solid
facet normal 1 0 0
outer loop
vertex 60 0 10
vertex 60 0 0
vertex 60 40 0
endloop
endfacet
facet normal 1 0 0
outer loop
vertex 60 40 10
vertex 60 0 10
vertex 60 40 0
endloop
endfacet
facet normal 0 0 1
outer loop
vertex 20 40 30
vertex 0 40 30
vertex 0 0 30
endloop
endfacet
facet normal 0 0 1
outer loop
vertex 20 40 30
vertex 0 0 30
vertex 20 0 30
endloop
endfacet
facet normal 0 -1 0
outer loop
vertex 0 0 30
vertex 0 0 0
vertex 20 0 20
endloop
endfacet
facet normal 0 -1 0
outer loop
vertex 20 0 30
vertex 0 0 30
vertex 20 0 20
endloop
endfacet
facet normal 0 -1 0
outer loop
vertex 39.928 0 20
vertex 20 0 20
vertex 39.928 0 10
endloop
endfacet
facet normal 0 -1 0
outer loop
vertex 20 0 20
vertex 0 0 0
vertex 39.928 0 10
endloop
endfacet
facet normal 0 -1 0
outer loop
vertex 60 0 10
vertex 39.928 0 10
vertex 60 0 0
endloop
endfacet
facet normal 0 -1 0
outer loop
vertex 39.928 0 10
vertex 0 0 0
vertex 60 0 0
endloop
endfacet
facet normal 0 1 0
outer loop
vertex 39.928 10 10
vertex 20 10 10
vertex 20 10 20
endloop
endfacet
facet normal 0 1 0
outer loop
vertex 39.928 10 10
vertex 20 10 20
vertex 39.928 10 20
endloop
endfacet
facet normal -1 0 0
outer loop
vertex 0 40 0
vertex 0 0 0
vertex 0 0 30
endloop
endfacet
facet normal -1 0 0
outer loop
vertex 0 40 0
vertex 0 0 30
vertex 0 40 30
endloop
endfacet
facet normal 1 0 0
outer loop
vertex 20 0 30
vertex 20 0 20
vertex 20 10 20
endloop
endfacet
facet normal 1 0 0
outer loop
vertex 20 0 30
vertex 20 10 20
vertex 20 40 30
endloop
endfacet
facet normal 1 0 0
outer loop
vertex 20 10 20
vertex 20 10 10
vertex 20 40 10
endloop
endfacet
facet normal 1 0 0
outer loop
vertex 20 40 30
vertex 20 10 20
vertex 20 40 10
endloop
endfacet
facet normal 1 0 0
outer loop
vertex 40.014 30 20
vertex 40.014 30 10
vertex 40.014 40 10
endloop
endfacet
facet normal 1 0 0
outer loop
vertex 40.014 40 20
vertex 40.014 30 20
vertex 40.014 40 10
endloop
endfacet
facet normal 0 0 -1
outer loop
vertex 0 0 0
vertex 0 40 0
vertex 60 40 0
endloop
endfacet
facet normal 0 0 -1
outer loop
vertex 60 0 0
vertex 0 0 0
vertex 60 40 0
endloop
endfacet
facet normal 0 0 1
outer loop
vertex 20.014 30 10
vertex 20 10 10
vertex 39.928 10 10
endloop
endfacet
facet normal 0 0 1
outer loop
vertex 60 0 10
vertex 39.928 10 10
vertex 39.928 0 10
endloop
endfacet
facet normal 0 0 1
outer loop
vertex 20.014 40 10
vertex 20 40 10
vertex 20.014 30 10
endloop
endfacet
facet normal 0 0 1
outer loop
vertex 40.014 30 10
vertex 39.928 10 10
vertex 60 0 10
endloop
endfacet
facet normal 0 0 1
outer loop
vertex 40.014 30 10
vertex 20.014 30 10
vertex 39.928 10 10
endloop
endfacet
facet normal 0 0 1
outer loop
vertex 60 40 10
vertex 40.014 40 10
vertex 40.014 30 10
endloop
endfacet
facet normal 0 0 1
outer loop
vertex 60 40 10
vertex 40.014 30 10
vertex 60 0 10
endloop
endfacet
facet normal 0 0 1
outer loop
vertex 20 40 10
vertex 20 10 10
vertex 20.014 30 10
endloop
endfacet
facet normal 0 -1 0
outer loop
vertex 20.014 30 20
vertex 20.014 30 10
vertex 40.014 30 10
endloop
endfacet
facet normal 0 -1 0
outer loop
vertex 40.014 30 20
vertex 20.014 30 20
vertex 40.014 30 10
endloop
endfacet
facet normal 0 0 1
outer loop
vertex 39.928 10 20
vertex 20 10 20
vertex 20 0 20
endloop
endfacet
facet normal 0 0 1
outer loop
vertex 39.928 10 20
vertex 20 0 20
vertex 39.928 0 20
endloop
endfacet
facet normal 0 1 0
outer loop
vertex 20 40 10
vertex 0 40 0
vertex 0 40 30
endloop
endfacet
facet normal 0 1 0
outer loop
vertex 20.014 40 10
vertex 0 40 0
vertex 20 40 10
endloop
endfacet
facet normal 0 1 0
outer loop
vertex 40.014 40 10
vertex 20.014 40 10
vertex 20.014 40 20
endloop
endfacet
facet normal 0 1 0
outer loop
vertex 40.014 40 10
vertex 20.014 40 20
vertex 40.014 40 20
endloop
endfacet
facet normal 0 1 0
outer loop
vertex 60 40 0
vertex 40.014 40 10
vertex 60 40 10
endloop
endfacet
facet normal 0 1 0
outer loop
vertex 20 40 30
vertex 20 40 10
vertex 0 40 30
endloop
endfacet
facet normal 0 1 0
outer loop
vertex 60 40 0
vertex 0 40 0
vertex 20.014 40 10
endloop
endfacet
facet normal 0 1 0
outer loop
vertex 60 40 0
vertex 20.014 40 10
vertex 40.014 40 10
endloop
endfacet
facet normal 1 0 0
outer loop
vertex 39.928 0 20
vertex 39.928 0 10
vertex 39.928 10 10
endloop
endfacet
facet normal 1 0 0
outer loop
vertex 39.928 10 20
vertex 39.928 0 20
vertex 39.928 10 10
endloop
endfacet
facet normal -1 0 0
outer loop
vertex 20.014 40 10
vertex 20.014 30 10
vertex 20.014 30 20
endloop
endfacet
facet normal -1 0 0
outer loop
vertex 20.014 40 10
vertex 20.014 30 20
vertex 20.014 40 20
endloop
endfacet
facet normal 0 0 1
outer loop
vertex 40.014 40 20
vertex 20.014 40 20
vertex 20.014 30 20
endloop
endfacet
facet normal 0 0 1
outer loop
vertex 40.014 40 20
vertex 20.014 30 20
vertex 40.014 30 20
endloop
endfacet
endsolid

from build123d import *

# Parameters (mm, degrees)
F0_W     = 60
F0_H     = 40
F3_DEPTH = 10
F1_W     = 20
F1_H     = 40
F4_DEPTH = 30
F2_W     = 20
F2_H     = 10
F5_DEPTH = 20


with BuildPart() as f3:
    # F0 (on Top) → F3 (new body)
    with BuildSketch(Plane.XY):
        with Locations((30, 20)):
            Rectangle(F0_W, F0_H)
    extrude(amount=F3_DEPTH)

    # F1 (on Top) → F4 (join)
    with BuildSketch(Plane.XY):
        with Locations((10, 20)):
            Rectangle(F1_W, F1_H)
    extrude(amount=F4_DEPTH)

    # F2 (on Top) → F5 (join)
    with BuildSketch(Plane.XY):
        with Locations((29.928178, 5)):
            Rectangle(F2_W, F2_H)
        with Locations((30.014171, 35)):
            Rectangle(F2_W, F2_H)
    extrude(amount=F5_DEPTH)


solid = f3.part
